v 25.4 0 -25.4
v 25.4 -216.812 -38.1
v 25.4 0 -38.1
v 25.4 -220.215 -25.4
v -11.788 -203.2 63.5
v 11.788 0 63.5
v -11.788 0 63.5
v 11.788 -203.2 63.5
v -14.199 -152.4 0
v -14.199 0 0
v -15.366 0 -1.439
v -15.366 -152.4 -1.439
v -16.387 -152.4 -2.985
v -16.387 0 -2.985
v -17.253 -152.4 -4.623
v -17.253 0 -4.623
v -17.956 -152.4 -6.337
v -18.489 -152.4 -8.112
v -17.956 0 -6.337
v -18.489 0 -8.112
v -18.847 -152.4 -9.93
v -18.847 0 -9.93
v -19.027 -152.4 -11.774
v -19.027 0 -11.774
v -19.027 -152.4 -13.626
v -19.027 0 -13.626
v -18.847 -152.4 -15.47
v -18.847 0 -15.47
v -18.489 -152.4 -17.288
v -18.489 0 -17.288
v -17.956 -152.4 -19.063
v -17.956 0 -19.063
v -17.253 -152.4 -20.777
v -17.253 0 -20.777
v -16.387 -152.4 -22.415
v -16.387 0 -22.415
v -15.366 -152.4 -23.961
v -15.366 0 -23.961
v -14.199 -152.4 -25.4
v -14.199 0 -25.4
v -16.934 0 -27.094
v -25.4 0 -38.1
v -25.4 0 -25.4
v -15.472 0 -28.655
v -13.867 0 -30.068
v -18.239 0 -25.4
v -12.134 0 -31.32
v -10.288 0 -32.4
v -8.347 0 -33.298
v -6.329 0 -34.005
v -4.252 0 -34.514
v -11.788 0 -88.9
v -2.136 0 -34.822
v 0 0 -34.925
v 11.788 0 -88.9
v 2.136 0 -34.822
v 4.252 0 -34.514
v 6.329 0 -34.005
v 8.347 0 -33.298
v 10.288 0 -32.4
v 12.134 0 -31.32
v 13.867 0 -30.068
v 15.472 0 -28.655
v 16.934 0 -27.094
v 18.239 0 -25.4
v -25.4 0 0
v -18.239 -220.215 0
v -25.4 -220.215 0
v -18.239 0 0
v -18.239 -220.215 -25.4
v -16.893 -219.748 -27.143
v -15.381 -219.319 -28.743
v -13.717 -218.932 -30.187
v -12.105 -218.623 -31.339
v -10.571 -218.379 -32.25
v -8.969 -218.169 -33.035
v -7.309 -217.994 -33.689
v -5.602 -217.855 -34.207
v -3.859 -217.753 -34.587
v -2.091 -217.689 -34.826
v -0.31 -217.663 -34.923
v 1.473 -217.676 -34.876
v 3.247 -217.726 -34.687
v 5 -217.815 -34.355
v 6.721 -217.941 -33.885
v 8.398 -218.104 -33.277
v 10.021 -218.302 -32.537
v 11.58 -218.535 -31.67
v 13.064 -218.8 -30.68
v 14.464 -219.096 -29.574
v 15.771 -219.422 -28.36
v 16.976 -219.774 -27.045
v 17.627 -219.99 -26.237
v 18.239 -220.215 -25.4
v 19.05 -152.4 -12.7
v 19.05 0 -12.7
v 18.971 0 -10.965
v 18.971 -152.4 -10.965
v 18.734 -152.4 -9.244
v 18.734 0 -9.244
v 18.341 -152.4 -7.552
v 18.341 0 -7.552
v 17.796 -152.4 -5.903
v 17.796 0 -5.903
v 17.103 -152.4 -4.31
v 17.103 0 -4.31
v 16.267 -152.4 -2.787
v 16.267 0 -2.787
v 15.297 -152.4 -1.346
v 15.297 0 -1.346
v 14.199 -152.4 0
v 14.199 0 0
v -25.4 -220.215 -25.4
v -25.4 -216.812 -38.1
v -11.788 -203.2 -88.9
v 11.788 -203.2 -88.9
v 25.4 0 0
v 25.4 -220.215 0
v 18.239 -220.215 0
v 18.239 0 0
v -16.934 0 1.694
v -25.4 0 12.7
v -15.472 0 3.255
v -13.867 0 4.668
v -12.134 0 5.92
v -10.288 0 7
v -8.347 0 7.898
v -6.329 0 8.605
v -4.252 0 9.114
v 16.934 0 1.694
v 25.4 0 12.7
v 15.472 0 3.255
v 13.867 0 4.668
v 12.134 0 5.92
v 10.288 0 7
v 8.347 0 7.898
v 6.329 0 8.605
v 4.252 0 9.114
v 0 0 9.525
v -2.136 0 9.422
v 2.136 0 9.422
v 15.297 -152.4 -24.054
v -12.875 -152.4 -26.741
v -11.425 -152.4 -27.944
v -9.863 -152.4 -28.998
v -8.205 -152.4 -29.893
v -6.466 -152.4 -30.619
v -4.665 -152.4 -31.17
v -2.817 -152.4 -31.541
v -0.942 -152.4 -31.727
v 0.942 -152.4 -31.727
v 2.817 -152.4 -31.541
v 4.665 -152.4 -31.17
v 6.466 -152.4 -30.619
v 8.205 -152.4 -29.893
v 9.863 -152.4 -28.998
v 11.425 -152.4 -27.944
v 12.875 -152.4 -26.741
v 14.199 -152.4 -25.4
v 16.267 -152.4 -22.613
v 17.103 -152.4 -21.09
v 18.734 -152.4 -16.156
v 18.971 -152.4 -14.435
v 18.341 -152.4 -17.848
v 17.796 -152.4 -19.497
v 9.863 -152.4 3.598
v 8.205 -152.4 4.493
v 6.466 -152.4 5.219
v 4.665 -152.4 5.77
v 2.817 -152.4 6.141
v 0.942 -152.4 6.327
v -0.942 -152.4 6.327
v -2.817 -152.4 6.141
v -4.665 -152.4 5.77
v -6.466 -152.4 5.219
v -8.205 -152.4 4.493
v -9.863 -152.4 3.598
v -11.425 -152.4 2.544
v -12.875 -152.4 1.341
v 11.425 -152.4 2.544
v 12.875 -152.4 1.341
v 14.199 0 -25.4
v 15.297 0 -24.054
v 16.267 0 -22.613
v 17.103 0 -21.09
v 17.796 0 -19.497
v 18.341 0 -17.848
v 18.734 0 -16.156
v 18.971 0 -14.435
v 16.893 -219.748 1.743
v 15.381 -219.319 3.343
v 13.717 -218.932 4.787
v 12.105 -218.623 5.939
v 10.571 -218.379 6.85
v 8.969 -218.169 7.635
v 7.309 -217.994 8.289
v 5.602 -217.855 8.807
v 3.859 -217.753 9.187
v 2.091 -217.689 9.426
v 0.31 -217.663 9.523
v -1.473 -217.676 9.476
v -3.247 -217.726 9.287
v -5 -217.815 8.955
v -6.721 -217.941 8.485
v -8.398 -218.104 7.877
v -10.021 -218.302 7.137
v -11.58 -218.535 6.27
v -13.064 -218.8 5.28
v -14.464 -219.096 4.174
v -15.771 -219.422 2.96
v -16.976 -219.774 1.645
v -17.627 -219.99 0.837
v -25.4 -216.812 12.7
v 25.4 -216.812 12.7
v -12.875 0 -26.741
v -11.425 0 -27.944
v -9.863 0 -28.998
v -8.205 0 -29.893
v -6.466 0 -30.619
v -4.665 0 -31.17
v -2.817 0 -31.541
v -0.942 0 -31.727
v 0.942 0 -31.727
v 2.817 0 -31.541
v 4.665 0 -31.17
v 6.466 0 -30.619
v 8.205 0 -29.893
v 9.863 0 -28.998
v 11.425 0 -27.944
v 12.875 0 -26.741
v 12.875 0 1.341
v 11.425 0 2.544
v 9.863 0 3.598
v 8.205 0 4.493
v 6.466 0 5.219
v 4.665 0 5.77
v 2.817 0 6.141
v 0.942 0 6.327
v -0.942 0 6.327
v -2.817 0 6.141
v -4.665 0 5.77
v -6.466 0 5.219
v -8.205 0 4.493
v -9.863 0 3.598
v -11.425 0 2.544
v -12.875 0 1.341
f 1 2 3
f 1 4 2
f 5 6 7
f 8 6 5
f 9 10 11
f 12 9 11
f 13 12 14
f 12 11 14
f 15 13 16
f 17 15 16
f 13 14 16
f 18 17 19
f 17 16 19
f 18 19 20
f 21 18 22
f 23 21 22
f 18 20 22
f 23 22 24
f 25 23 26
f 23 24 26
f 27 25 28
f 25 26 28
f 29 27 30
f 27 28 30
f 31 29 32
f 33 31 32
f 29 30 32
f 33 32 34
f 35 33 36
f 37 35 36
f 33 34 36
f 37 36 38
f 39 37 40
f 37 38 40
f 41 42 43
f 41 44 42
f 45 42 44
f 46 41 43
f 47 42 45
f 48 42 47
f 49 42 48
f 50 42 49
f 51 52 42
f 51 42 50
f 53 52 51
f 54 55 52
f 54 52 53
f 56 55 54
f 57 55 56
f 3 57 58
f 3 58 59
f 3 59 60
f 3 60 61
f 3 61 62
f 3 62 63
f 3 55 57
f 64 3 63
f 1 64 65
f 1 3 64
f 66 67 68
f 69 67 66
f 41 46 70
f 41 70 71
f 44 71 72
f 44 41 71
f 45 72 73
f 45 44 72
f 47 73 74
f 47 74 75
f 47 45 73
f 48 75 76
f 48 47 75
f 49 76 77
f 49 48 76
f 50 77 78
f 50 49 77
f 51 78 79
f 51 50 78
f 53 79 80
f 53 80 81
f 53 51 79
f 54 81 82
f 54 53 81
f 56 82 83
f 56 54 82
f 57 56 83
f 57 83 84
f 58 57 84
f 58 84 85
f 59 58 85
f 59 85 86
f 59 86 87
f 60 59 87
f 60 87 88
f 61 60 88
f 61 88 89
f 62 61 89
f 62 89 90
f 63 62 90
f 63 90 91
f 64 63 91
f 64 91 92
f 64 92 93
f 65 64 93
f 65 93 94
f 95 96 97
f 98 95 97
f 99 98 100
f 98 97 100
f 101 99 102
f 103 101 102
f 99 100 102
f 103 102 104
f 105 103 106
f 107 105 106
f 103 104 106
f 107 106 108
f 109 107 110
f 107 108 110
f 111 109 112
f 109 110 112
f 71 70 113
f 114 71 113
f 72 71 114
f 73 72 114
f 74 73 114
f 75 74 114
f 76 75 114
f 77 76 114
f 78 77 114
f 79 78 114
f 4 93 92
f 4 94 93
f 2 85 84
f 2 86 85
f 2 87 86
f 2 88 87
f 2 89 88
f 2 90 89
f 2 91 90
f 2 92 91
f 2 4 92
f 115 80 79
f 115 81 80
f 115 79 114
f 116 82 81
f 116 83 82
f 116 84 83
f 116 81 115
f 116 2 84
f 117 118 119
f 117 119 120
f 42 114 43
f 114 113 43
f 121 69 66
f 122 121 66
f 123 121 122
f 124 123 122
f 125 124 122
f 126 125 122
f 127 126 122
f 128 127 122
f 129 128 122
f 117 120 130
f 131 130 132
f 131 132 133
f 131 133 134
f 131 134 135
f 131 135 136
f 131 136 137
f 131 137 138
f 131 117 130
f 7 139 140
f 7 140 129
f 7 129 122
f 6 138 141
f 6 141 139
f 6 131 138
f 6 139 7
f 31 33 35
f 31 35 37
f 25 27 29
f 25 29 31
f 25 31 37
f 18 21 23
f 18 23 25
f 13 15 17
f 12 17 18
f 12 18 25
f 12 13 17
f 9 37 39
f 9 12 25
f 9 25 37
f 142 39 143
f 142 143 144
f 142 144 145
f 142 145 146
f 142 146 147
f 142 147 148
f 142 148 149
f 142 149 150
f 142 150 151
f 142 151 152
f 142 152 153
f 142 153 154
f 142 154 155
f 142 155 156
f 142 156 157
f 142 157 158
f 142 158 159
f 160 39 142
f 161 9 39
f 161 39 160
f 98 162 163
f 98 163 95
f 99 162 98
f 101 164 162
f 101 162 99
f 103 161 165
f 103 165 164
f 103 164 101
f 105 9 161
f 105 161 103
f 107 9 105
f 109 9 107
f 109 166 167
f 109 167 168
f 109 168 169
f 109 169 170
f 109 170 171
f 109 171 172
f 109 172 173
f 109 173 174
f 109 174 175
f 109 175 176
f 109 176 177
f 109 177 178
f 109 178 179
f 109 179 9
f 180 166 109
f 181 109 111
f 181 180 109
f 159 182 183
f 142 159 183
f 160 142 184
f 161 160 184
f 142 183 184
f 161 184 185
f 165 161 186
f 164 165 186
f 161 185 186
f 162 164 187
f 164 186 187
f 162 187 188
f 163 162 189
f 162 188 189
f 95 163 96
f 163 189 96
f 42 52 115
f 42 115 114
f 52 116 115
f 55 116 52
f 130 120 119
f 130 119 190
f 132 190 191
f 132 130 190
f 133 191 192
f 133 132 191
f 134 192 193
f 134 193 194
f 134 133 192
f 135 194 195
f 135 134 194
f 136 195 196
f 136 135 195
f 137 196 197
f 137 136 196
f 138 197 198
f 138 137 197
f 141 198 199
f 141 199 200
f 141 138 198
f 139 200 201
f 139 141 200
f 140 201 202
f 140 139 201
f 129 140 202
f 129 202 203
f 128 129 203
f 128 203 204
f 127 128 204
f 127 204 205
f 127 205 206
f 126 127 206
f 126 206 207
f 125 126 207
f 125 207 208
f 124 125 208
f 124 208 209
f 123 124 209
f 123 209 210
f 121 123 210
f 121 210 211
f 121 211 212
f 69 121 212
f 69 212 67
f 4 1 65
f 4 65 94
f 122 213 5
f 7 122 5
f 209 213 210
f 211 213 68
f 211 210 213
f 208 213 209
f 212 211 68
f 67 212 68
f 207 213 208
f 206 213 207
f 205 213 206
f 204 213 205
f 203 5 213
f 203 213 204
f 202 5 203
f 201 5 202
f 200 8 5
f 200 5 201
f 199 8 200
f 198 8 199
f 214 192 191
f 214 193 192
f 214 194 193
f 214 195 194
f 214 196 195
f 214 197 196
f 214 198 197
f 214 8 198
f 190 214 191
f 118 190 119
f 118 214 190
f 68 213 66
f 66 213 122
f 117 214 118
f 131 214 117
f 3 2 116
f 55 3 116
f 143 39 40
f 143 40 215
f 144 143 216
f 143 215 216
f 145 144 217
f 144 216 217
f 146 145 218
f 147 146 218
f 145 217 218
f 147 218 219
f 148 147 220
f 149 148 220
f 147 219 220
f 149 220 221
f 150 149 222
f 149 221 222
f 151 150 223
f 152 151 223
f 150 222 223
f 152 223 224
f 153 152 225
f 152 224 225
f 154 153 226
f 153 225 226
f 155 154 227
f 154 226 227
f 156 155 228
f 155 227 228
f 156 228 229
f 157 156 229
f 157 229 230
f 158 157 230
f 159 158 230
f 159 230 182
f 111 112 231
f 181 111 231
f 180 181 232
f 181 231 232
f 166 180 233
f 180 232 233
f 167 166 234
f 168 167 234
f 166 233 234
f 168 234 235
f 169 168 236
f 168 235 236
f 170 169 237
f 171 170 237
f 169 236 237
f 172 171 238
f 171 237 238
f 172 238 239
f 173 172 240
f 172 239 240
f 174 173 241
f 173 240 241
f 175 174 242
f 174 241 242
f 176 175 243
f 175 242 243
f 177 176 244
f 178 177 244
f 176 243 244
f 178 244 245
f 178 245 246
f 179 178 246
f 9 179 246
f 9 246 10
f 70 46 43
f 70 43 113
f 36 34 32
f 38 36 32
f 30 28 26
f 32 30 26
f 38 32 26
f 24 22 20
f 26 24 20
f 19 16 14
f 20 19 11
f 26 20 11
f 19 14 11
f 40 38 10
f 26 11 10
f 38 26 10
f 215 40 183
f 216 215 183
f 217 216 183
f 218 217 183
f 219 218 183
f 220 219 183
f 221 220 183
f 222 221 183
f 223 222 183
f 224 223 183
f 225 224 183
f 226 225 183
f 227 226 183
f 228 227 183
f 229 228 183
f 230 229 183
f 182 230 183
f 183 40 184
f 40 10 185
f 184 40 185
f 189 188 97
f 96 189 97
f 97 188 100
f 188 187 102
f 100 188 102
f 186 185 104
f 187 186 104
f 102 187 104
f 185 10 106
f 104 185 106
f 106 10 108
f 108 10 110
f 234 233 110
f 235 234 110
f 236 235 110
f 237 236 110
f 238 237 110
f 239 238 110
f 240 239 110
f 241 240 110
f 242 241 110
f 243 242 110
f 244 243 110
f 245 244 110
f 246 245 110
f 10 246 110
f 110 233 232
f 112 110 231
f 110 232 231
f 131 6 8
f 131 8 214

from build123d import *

# Parameters (mm, degrees)
F1_DEPTH  = 25.4
F1_FACE_W = 50.8
F1_FACE_H = 65.740037456
F3_DEPTH  = 220.2157737194
F5_DEPTH  = 220.2157737194
F6_DEPTH  = 152.4


with BuildPart() as f1:
    # F0 (on Right) → F1 (new body, symmetric)
    with BuildSketch(Plane.YZ):
        Polygon((-220.2147737194, 0), (0, 0), (0, 63.5), (-203.2, 63.5), align=None)
    extrude(amount=F1_DEPTH, both=True)


with BuildPart() as f1b:
    # F0 (on Right) → F1, piece 2 (new body, symmetric)
    with BuildSketch(Plane.YZ):
        Polygon((0, -88.9), (0, -25.4), (-220.2147737194, -25.4), (-203.2, -88.9), align=None)
    extrude(amount=F1_DEPTH, both=True)


with BuildPart() as f3_tool:
    # F2 (on Front) + F1_face (on face) → F3 (new body, through all)
    with BuildSketch(Plane.XZ):
        with BuildLine():
            Line((0, -25.4), (0, 0))
            Line((0, 0), (-14.1990316571, 0))
            ThreePointArc((-14.1990316571, 0), (-19.05, -12.7), (-14.1990316571, -25.4))
            Line((-14.1990316571, -25.4), (0, -25.4))
        make_face()
        with BuildLine():
            ThreePointArc((19.05, -12.7), (17.7959834382, -5.9025391898), (14.1990316571, 0))
            Line((14.1990316571, 0), (0, 0))
            Line((0, 0), (0, -25.4))
            Line((0, -25.4), (14.1990316571, -25.4))
            ThreePointArc((14.1990316571, -25.4), (17.7959834382, -19.4974608102), (19.05, -12.7))
        make_face()
        with BuildLine():
            Line((14.1990316571, -25.4), (0, -25.4))
            Line((0, -25.4), (-14.1990316571, -25.4))
            ThreePointArc((-14.1990316571, -25.4), (0, -31.75), (14.1990316571, -25.4))
        make_face()
        with BuildLine():
            Line((0, 0), (14.1990316571, 0))
            ThreePointArc((14.1990316571, 0), (0, 6.35), (-14.1990316571, 0))
            Line((-14.1990316571, 0), (0, 0))
        make_face()
        with BuildLine():
            ThreePointArc((22.225, -12.7), (21.2050948807, -6.0445829508), (18.2389864028, 0))
            Line((18.2389864028, 0), (14.1990316571, 0))
            ThreePointArc((14.1990316571, 0), (17.7959834382, -5.9025391898), (19.05, -12.7))
            ThreePointArc((19.05, -12.7), (17.7959834382, -19.4974608102), (14.1990316571, -25.4))
            Line((14.1990316571, -25.4), (18.2389864028, -25.4))
            ThreePointArc((18.2389864028, -25.4), (21.2050948807, -19.3554170492), (22.225, -12.7))
        make_face()
        with BuildLine():
            Line((-14.1990316571, 0), (-18.2389864028, 0))
            ThreePointArc((-18.2389864028, 0), (-22.225, -12.7), (-18.2389864028, -25.4))
            Line((-18.2389864028, -25.4), (-14.1990316571, -25.4))
            ThreePointArc((-14.1990316571, -25.4), (-19.05, -12.7), (-14.1990316571, 0))
        make_face()
        with BuildLine():
            Line((14.1990316571, 0), (18.2389864028, 0))
            ThreePointArc((18.2389864028, 0), (0, 9.525), (-18.2389864028, 0))
            Line((-18.2389864028, 0), (-14.1990316571, 0))
            ThreePointArc((-14.1990316571, 0), (0, 6.35), (14.1990316571, 0))
        make_face()
        with BuildLine():
            ThreePointArc((-18.2389864028, -25.4), (0, -34.925), (18.2389864028, -25.4))
            Line((18.2389864028, -25.4), (14.1990316571, -25.4))
            ThreePointArc((14.1990316571, -25.4), (0, -31.75), (-14.1990316571, -25.4))
            Line((-14.1990316571, -25.4), (-18.2389864028, -25.4))
        make_face()
    with BuildSketch(Plane(origin=(0, -211.7073868597, 31.75), x_dir=(1, 0, 0), z_dir=(0, -0.9659258263, 0.2588190451))):
        Rectangle(F1_FACE_W, F1_FACE_H)
    extrude(amount=F3_DEPTH, dir=(0, -1, 0))


with BuildPart() as f1_1:
    add(f1.part)

    # F3: cut by f3_tool
    add(f3_tool.part, mode=Mode.SUBTRACT)


with BuildPart() as f1b_1:
    add(f1b.part)

    # F3: cut by f3_tool
    add(f3_tool.part, mode=Mode.SUBTRACT)


with BuildPart() as f5_tool:
    # F4 (on Front) → F5 (new body, through all)
    with BuildSketch(Plane.XZ):
        Polygon((-25.4, -88.9), (-11.7881810245, -88.9), (-25.4, -38.1), align=None)
        Polygon((25.4, -88.9), (25.4, -38.1), (11.7881810245, -88.9), align=None)
        Polygon((25.4, 12.7), (25.4, 63.5), (11.7881810245, 63.5), align=None)
        Polygon((-25.4, 12.7), (-11.7881810245, 63.5), (-25.4, 63.5), align=None)
    extrude(amount=F5_DEPTH)


with BuildPart() as f1_2:
    add(f1_1.part)

    # F5: cut by f5_tool
    add(f5_tool.part, mode=Mode.SUBTRACT)


with BuildPart() as f1b_2:
    add(f1b_1.part)

    # F5: cut by f5_tool
    add(f5_tool.part, mode=Mode.SUBTRACT)


with BuildPart() as f6:
    # F2 (on Front) → F6 (new body)
    with BuildSketch(Plane.XZ):
        with BuildLine():
            Line((0, -25.4), (0, 0))
            Line((0, 0), (-14.1990316571, 0))
            ThreePointArc((-14.1990316571, 0), (-19.05, -12.7), (-14.1990316571, -25.4))
            Line((-14.1990316571, -25.4), (0, -25.4))
        make_face()
        with BuildLine():
            ThreePointArc((19.05, -12.7), (17.7959834382, -5.9025391898), (14.1990316571, 0))
            Line((14.1990316571, 0), (0, 0))
            Line((0, 0), (0, -25.4))
            Line((0, -25.4), (14.1990316571, -25.4))
            ThreePointArc((14.1990316571, -25.4), (17.7959834382, -19.4974608102), (19.05, -12.7))
        make_face()
        with BuildLine():
            Line((0, 0), (14.1990316571, 0))
            ThreePointArc((14.1990316571, 0), (0, 6.35), (-14.1990316571, 0))
            Line((-14.1990316571, 0), (0, 0))
        make_face()
        with BuildLine():
            Line((14.1990316571, -25.4), (0, -25.4))
            Line((0, -25.4), (-14.1990316571, -25.4))
            ThreePointArc((-14.1990316571, -25.4), (0, -31.75), (14.1990316571, -25.4))
        make_face()
    extrude(amount=F6_DEPTH)


solid = Compound([f1_2.part, f1b_2.part, f6.part])
